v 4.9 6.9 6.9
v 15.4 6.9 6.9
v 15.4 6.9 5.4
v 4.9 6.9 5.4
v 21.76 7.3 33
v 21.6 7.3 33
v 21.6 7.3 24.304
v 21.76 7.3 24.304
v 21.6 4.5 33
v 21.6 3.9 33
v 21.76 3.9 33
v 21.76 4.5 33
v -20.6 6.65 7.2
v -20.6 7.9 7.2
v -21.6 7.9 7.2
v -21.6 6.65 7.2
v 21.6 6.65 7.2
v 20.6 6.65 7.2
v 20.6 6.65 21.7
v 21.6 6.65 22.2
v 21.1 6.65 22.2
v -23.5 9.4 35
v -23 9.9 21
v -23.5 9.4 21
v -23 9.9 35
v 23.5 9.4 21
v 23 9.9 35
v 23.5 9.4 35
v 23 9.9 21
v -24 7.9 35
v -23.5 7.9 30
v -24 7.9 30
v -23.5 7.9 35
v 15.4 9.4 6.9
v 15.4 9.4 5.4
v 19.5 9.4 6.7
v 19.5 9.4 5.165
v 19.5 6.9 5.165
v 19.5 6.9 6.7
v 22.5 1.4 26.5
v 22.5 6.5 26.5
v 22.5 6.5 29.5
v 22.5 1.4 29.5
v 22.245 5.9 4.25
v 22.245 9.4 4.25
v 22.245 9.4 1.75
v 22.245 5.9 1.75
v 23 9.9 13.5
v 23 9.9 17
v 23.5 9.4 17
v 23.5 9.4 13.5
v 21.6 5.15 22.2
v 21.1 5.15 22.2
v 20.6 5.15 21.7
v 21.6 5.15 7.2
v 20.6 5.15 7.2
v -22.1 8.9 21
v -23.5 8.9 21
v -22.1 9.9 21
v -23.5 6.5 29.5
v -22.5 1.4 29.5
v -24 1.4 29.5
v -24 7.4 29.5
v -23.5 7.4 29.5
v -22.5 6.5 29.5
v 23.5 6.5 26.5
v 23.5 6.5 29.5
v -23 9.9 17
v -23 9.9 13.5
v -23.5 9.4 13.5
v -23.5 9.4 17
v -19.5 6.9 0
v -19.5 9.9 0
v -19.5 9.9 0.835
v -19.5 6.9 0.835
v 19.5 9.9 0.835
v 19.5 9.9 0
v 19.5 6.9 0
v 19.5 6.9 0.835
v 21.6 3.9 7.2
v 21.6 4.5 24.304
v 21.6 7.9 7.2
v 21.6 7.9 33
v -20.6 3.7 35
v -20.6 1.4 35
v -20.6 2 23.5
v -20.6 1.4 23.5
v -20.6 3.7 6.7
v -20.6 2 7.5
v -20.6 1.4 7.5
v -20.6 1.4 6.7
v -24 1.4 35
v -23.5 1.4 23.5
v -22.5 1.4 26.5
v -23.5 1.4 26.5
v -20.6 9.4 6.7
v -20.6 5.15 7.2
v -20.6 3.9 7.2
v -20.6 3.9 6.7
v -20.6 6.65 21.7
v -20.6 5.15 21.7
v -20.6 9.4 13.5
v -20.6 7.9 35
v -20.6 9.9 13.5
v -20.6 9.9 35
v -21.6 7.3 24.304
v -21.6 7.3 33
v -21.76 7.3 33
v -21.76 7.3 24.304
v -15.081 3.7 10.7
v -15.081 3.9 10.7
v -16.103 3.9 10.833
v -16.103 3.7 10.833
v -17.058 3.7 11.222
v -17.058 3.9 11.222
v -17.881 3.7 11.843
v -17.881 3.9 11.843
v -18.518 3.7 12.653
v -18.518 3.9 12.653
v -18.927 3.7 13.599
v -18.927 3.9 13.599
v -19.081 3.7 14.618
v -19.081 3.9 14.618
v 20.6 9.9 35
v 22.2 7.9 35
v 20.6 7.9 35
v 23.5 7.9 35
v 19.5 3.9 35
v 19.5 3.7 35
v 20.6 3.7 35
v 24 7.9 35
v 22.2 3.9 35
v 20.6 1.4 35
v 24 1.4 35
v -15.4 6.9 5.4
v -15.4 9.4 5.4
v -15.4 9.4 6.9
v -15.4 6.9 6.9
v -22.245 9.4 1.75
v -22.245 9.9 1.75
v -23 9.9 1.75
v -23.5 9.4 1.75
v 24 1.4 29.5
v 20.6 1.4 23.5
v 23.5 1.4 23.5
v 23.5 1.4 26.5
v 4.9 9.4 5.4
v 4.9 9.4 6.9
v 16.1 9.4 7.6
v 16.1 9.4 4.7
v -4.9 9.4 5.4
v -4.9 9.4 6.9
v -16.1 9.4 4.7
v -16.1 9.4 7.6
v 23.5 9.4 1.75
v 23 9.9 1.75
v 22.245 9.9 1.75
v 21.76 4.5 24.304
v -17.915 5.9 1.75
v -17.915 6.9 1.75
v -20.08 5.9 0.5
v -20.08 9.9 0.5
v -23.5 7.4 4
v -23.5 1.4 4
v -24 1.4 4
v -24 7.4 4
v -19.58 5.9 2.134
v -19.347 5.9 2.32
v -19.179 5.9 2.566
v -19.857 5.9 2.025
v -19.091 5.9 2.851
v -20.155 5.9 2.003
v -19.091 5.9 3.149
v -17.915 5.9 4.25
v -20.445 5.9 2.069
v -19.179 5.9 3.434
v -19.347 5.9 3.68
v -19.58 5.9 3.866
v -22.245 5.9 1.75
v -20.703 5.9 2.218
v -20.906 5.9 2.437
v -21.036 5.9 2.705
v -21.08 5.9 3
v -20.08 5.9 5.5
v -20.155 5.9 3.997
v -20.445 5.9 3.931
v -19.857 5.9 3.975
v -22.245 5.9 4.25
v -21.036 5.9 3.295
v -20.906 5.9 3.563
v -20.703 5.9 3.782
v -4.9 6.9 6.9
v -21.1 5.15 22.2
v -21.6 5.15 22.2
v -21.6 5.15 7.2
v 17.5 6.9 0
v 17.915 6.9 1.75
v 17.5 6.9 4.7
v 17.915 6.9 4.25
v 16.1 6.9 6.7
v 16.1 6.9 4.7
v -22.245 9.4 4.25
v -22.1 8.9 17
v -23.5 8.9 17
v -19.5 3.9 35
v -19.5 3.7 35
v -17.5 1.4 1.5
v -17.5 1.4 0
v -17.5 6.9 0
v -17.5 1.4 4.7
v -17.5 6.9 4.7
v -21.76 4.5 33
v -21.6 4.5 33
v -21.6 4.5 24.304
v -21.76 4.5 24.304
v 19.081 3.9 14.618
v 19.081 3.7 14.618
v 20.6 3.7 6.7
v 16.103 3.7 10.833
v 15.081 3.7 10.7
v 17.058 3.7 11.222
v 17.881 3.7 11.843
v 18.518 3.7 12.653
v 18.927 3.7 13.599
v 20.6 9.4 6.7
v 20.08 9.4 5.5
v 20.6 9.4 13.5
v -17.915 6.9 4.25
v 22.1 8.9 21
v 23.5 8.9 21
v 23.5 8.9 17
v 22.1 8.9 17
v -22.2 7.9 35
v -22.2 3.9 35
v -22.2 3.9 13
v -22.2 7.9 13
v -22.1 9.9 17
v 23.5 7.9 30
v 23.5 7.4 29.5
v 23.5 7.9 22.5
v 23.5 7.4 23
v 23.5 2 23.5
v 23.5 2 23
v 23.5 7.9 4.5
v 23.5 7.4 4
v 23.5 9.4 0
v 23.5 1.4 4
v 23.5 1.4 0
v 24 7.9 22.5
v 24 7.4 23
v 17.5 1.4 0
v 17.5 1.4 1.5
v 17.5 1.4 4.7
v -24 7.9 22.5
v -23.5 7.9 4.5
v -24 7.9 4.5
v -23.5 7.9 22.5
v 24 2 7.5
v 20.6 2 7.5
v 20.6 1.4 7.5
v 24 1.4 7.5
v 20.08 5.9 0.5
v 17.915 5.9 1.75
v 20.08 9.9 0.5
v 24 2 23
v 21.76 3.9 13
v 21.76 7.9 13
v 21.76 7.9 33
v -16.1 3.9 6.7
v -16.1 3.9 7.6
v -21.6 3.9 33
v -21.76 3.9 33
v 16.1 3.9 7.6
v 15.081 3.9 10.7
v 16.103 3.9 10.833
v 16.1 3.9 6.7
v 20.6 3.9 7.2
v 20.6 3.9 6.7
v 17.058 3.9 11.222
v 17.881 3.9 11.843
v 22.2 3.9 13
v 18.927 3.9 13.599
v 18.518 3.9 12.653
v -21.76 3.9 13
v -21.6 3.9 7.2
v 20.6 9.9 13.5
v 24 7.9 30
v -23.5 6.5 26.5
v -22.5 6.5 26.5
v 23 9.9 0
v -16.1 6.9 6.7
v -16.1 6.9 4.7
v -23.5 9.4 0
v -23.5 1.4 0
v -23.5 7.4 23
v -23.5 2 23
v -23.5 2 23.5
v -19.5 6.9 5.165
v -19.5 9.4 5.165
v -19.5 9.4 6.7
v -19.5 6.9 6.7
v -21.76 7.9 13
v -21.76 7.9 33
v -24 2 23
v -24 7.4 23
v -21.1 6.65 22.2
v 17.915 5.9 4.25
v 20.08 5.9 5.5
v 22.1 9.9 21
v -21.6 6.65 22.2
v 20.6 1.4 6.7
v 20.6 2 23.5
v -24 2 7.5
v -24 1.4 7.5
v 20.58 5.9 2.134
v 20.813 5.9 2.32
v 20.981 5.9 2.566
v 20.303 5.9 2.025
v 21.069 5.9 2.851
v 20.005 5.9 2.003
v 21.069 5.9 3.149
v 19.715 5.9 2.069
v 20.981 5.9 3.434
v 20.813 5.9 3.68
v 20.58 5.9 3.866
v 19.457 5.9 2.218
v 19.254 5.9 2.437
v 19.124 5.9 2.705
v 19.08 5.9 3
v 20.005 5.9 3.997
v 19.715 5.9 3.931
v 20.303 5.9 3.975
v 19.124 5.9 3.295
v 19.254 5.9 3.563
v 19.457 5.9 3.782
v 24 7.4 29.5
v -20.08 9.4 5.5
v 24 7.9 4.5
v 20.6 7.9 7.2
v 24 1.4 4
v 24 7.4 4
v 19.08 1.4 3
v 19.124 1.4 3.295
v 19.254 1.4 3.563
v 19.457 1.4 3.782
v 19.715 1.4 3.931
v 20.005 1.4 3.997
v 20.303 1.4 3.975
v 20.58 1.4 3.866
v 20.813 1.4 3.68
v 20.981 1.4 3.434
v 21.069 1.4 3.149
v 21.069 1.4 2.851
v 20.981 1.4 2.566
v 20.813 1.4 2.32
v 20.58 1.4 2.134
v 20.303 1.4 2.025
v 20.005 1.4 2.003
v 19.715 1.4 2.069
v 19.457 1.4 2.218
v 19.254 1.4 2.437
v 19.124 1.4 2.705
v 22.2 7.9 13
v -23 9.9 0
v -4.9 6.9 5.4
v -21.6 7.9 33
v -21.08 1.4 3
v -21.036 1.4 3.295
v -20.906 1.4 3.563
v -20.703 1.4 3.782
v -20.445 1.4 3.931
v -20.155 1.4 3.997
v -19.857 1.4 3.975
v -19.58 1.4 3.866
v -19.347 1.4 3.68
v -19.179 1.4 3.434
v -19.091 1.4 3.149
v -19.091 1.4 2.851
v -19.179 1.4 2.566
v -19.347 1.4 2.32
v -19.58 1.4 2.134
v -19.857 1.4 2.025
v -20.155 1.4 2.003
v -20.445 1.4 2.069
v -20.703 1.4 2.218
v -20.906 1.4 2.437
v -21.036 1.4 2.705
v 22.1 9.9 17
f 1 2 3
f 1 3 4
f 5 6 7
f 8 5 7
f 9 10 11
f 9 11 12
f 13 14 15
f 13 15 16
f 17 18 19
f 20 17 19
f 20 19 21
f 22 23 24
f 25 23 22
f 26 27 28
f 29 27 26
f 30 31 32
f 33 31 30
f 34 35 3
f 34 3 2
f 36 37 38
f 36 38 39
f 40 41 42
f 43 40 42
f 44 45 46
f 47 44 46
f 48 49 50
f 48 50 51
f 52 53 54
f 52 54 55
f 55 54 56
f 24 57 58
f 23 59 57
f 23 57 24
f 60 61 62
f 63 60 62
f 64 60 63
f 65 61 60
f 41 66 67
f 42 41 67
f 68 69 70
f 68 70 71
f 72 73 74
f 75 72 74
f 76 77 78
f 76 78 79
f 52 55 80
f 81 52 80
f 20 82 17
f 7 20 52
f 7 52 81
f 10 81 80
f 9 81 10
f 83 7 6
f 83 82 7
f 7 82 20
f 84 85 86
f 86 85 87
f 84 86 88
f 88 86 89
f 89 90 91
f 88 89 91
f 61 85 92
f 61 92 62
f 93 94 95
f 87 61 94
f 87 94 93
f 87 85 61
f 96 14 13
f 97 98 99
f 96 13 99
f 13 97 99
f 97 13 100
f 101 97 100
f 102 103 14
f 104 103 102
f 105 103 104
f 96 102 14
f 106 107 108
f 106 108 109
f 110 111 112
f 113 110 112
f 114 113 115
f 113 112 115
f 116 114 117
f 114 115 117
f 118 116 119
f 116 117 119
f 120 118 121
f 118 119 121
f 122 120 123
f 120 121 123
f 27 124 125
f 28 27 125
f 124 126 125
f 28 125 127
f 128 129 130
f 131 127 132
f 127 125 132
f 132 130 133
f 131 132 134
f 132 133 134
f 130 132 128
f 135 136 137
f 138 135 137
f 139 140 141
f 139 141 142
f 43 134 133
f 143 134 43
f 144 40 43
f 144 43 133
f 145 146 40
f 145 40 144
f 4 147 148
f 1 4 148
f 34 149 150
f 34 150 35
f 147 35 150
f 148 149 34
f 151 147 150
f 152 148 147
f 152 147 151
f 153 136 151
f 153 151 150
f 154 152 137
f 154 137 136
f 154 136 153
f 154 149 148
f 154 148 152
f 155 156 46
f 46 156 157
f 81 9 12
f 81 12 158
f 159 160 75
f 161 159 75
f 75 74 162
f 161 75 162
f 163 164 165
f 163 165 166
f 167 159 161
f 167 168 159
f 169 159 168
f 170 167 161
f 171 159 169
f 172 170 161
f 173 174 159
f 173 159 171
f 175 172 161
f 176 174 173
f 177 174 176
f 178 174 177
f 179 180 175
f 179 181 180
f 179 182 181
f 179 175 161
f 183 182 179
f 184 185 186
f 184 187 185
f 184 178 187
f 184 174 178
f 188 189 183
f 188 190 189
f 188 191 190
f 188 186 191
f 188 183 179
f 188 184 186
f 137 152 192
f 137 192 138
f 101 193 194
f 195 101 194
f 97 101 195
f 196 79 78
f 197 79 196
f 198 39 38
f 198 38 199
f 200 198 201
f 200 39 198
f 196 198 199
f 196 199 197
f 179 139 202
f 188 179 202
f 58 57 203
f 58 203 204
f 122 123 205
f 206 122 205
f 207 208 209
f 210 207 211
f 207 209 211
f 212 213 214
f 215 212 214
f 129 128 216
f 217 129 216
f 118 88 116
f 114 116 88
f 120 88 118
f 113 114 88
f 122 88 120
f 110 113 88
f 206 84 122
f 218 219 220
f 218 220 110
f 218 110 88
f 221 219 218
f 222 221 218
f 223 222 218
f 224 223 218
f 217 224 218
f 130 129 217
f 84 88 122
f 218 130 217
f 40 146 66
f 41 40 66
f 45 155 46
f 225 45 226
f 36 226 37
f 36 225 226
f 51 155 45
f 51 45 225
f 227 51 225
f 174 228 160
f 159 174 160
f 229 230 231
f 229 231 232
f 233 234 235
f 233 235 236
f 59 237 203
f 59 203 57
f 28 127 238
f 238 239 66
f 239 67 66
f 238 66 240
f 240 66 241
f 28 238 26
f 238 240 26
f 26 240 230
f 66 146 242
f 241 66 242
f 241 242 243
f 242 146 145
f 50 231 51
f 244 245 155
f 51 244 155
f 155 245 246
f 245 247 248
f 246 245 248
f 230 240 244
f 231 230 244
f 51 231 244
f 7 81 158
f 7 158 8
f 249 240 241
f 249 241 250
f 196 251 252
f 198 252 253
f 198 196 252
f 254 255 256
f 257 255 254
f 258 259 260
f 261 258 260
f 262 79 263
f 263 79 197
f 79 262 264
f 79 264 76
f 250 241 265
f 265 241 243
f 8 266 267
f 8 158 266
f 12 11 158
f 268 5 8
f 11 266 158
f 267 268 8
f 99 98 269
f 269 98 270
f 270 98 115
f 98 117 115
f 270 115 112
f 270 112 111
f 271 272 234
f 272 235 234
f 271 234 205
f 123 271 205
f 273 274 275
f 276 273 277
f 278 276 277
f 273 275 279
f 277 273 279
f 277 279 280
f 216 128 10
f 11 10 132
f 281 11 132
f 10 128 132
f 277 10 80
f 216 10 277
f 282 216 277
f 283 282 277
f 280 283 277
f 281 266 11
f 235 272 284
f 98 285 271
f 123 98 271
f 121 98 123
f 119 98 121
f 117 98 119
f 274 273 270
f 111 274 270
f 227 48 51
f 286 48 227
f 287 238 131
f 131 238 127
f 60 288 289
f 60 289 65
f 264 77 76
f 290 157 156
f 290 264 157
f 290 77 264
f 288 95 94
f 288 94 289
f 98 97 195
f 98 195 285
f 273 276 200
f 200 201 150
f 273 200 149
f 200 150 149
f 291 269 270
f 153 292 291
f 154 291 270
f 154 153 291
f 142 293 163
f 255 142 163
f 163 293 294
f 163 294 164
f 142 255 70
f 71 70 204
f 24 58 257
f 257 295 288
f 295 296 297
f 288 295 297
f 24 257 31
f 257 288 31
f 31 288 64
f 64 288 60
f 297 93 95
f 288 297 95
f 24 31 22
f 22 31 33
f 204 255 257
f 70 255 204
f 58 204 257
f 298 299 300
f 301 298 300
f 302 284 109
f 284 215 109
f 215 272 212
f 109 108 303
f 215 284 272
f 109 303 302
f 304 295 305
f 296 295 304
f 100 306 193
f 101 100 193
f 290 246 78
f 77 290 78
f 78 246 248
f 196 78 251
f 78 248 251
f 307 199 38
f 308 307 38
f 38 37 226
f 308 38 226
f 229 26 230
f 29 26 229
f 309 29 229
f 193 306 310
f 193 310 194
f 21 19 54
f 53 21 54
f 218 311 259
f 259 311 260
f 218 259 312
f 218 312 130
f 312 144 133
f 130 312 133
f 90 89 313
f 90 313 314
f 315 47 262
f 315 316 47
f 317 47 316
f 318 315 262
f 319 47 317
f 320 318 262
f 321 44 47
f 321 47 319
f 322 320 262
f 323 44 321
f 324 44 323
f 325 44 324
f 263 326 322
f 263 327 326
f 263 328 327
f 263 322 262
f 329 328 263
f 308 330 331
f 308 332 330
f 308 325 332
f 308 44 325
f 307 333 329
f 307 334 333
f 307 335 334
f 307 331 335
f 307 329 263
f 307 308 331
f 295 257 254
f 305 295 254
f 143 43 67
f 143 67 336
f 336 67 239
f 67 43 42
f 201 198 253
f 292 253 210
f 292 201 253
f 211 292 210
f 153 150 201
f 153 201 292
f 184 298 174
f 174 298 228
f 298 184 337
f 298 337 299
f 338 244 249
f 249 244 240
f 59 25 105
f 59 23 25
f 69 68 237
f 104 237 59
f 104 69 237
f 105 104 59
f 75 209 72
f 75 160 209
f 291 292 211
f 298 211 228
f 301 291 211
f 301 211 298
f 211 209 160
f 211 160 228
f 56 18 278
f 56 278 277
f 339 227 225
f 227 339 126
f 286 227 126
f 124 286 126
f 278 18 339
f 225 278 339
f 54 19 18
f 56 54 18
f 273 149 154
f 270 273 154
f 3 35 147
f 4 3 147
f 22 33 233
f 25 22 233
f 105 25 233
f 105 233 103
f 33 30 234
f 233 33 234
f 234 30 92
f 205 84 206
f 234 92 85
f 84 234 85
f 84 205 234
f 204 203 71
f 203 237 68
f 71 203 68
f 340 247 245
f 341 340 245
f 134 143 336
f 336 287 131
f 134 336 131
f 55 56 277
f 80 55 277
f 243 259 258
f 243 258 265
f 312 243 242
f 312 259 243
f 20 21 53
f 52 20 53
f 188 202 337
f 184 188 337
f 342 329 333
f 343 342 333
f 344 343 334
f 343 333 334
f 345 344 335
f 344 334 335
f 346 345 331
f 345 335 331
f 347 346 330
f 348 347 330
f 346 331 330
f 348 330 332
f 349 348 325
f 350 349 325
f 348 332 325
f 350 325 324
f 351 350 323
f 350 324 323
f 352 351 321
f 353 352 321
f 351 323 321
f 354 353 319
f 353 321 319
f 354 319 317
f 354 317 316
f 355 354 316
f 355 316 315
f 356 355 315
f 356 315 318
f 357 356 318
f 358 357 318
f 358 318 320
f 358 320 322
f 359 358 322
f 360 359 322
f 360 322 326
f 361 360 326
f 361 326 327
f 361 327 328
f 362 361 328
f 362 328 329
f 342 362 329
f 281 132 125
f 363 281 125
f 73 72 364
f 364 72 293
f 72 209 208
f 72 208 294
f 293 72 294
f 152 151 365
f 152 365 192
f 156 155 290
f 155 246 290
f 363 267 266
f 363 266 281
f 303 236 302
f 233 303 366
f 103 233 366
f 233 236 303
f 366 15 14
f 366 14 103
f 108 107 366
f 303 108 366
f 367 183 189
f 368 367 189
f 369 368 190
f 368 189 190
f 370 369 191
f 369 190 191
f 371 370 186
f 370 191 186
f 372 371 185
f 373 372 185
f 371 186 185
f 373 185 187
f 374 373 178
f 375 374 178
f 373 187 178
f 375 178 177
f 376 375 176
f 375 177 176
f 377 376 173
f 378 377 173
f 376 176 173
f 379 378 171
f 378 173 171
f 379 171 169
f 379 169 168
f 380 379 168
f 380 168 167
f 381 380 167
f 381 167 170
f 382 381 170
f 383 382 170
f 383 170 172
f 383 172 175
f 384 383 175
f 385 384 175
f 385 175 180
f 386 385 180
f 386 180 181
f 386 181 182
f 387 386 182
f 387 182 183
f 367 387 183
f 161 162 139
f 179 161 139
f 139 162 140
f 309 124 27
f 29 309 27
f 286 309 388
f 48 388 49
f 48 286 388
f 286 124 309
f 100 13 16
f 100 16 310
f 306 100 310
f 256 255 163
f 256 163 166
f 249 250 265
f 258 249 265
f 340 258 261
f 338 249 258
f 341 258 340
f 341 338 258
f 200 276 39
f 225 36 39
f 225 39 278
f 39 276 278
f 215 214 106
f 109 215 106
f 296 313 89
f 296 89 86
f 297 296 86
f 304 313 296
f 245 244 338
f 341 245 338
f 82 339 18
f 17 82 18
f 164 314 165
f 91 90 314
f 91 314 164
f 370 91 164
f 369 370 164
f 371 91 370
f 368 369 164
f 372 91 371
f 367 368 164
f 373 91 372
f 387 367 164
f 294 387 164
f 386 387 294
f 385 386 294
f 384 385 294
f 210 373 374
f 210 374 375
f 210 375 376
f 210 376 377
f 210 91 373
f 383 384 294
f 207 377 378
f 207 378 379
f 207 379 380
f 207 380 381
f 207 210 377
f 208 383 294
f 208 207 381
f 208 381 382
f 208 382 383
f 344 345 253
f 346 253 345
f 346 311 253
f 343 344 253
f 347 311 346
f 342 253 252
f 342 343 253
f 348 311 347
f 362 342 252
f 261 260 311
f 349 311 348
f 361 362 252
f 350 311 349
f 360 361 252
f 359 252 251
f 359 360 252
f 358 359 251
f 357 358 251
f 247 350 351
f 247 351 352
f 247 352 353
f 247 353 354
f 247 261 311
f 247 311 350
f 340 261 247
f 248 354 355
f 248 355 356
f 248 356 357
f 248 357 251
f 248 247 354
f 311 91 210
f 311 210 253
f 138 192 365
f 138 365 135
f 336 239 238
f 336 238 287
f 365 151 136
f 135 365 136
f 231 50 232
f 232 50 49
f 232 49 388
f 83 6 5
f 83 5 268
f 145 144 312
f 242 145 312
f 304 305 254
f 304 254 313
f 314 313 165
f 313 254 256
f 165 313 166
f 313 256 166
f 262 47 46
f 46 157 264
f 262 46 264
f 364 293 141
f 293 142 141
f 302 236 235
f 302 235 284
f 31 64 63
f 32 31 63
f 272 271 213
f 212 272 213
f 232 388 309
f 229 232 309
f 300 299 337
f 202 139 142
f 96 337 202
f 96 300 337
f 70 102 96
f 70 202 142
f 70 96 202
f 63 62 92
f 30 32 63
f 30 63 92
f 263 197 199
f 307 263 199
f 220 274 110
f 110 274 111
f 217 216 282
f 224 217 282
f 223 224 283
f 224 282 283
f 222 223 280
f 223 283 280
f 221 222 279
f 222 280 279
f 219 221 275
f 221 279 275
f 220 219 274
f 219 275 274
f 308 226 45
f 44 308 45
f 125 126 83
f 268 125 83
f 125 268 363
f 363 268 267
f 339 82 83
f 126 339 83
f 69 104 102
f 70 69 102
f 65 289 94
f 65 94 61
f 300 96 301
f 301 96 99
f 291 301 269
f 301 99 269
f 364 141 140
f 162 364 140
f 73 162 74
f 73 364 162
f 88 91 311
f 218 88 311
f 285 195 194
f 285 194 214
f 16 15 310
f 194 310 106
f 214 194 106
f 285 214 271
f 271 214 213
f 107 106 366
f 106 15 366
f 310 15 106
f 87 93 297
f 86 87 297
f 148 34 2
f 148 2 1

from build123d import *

# Parameters (mm, degrees)
EXTRUIR1_DEPTH         = 9.9
CROQUIS2_R             = 1
CORTAR_EXTRUIR1_DEPTH  = 15.9
CORTAR_EXTRUIR2_DEPTH  = 4
CROQUIS4_W             = 35
CROQUIS4_H             = 2.727458855
CORTAR_EXTRUIR3_DEPTH  = 24
CROQUIS5_W             = 35
CROQUIS5_H             = 3.2
CORTAR_EXTRUIR4_DEPTH  = 8.5
CROQUIS6_W             = 39
CROQUIS6_H             = 14.452712812
CORTAR_EXTRUIR5_DEPTH  = 3
EXTRUIR2_DEPTH         = 0.2
CROQUIS8_W             = 49.57319474
CROQUIS8_H             = 11.75
CORTAR_EXTRUIR6_DEPTH  = 0.5
CROQUIS9_W             = 2.460261438
CROQUIS9_H             = 4
CORTAR_EXTRUIR7_DEPTH  = 1
CHAFL_N1_SIZE          = 0.5
CHAFL_N2_SIZE          = 0.5
CROQUIS10_W            = 32.2
CROQUIS10_H            = 2.9
EXTRUIR3_DEPTH         = 5.5
CROQUIS11_W            = 10.5
CROQUIS11_H            = 1.5
CORTAR_EXTRUIR8_DEPTH  = 2.5
CROQUIS12_W            = 16
CROQUIS12_H            = 2
CORTAR_EXTRUIR9_DEPTH  = 57.5
CROQUIS13_W            = 35
CROQUIS13_H            = 3.2
CORTAR_EXTRUIR10_DEPTH = 0.7
CROQUIS15_W            = 5.5
CROQUIS15_H            = 7.9
EXTRUIR4_DEPTH         = 0.5
CHAFL_N3_SIZE          = 0.5
CROQUIS16_W            = 3
CROQUIS16_H            = 6.5
CORTAR_EXTRUIR11_DEPTH = 1
CHAFL_N4_SIZE          = 0.5
CORTAR_EXTRUIR12_DEPTH = 1
CHAFL_N5_SIZE          = 0.5
CHAFL_N6_SIZE          = 0.5
CROQUIS18_W            = 0.4398817
CROQUIS18_H            = 4
CORTAR_EXTRUIR13_DEPTH = 22
CROQUIS19_W            = 10.696044144
CROQUIS19_H            = 2.8
CORTAR_EXTRUIR14_DEPTH = 0.2
CROQUIS20_W            = 2
CROQUIS20_H            = 4
CORTAR_EXTRUIR15_DEPTH = 0.2
CROQUIS21_W            = 42.865199157
CROQUIS21_H            = 3.067417921
CORTAR_EXTRUIR16_DEPTH = 58


with BuildPart() as part:
    # Croquis1 → Extruir1 (new body)
    with BuildSketch(Plane(origin=(0, 0, 0), x_dir=(1, 0, 0), z_dir=(0, 1, 0))):
        Polygon((23.5, 0), (-23.5, 0), (-23.5, -35), (-20.6, -35), (-20.6, -6.7), (20.6, -6.7), (20.6, -35), (23.5, -35), align=None)
    extrude(amount=EXTRUIR1_DEPTH)

    # Croquis2 → Cortar-Extruir1 (cut)
    with BuildSketch(Plane(origin=(0, 9.9, 0), x_dir=(-1, 0, 0), z_dir=(0, 1, 0))):
        with Locations((-20.08, 3)):
            Circle(CROQUIS2_R)
        with Locations((20.08, 3)):
            Circle(CROQUIS2_R)
    extrude(amount=-CORTAR_EXTRUIR1_DEPTH, mode=Mode.SUBTRACT)

    # Croquis3 → Cortar-Extruir2 (cut)
    with BuildSketch(Plane(origin=(0, 9.9, 0), x_dir=(-1, 0, 0), z_dir=(0, 1, 0))):
        Polygon((-20.08, 5.5), (-22.245063509, 4.25), (-22.245063509, 1.75), (-20.08, 0.5), (-17.914936491, 1.75), (-17.914936491, 4.25), align=None)
        Polygon((20.08, 5.5), (17.914936491, 4.25), (17.914936491, 1.75), (20.08, 0.5), (22.245063509, 1.75), (22.245063509, 4.25), align=None)
    extrude(amount=-CORTAR_EXTRUIR2_DEPTH, mode=Mode.SUBTRACT)

    # Croquis4 → Cortar-Extruir3 (cut)
    with BuildSketch(Plane(origin=(0, 9.9, 0), x_dir=(-1, 0, 0), z_dir=(0, 1, 0))):
        with Locations((0, 0.136270572)):
            Rectangle(CROQUIS4_W, CROQUIS4_H)
    extrude(amount=-CORTAR_EXTRUIR3_DEPTH, mode=Mode.SUBTRACT)

    # Croquis5 → Cortar-Extruir4 (cut)
    with BuildSketch(Plane(origin=(0, 9.9, 0), x_dir=(-1, 0, 0), z_dir=(0, 1, 0))):
        with Locations((0, 3.1)):
            Rectangle(CROQUIS5_W, CROQUIS5_H)
    extrude(amount=-CORTAR_EXTRUIR4_DEPTH, mode=Mode.SUBTRACT)

    # Croquis6 → Cortar-Extruir5 (cut)
    with BuildSketch(Plane(origin=(0, 9.9, 0), x_dir=(-1, 0, 0), z_dir=(0, 1, 0))):
        with Locations((0, 5.388219545)):
            Rectangle(CROQUIS6_W, CROQUIS6_H)
    extrude(amount=-CORTAR_EXTRUIR5_DEPTH, mode=Mode.SUBTRACT)

    # Croquis7 → Extruir2 (add)
    with BuildSketch(Plane(origin=(0, 3.9, 0), x_dir=(-1, 0, 0), z_dir=(0, 1, 0))):
        with BuildLine():
            Line((-20.6, 35), (-19.5, 35))
            Line((-19.5, 35), (-19.080611376, 14.617712891))
            ThreePointArc((-19.080611376, 14.617712891), (-17.880640918, 11.842628092), (-15.081457862, 10.7))
            Line((-15.081457862, 10.7), (15.081457862, 10.7))
            ThreePointArc((15.081457862, 10.7), (17.880640918, 11.842628092), (19.080611376, 14.617712891))
            Line((19.080611376, 14.617712891), (19.5, 35))
            Line((19.5, 35), (20.6, 35))
            Line((20.6, 35), (20.6, 6.7))
            Line((20.6, 6.7), (-20.6, 6.7))
            Line((-20.6, 6.7), (-20.6, 35))
        make_face()
    extrude(amount=-EXTRUIR2_DEPTH)

    # Croquis8 → Cortar-Extruir6 (cut)
    with BuildSketch(Plane(origin=(0, 9.9, 0), x_dir=(-1, 0, 0), z_dir=(0, 1, 0))):
        with Locations((0.155531932, 7.625)):
            Rectangle(CROQUIS8_W, CROQUIS8_H)
    extrude(amount=-CORTAR_EXTRUIR6_DEPTH, mode=Mode.SUBTRACT)

    # Croquis9 → Cortar-Extruir7 (cut)
    with BuildSketch(Plane(origin=(0, 9.9, 0), x_dir=(-1, 0, 0), z_dir=(0, 1, 0))):
        with Locations((23.330130719, 19)):
            Rectangle(CROQUIS9_W, CROQUIS9_H)
        with Locations((-23.330130719, 19)):
            Rectangle(CROQUIS9_W, CROQUIS9_H)
    extrude(amount=-CORTAR_EXTRUIR7_DEPTH, mode=Mode.SUBTRACT)

    # Chaflán1
    chafl_n1_edges = [part.edges().sort_by_distance(p)[0] for p in [
        (23.5, 9.9, 15.25),
        (23.5, 9.9, 28),
        (-23.5, 9.9, 28),
        (-23.5, 9.9, 15.25),
    ]]
    chamfer(chafl_n1_edges, length=CHAFL_N1_SIZE)

    # Chaflán2
    chafl_n2_edges = [part.edges().sort_by_distance(p)[0] for p in [
        (23.5, 9.9, 0.875),
        (-23.5, 9.9, 0.875),
    ]]
    chamfer(chafl_n2_edges, length=CHAFL_N2_SIZE)

    # Croquis10 → Extruir3 (add)
    with BuildSketch(Plane(origin=(0, 9.4, 0), x_dir=(-1, 0, 0), z_dir=(0, 1, 0))):
        with Locations((0, 6.15)):
            Rectangle(CROQUIS10_W, CROQUIS10_H)
    extrude(amount=-EXTRUIR3_DEPTH)

    # Croquis11 → Cortar-Extruir8 (cut)
    with BuildSketch(Plane(origin=(0, 9.4, 0), x_dir=(-1, 0, 0), z_dir=(0, 1, 0))):
        with Locations((-10.15, 6.15)):
            Rectangle(CROQUIS11_W, CROQUIS11_H)
        with Locations((10.15, 6.15)):
            Rectangle(CROQUIS11_W, CROQUIS11_H)
    extrude(amount=-CORTAR_EXTRUIR8_DEPTH, mode=Mode.SUBTRACT)

    # Croquis12 → Cortar-Extruir9 (cut)
    with BuildSketch(Plane.ZY.offset(23.5)):
        with Locations((15.5, 1)):
            Rectangle(CROQUIS12_W, CROQUIS12_H)
    extrude(amount=-CORTAR_EXTRUIR9_DEPTH, mode=Mode.SUBTRACT)

    # Croquis13 → Cortar-Extruir10 (cut)
    with BuildSketch(Plane.XZ):
        with Locations((0, 3.1)):
            Rectangle(CROQUIS13_W, CROQUIS13_H)
    extrude(amount=-CORTAR_EXTRUIR10_DEPTH, mode=Mode.SUBTRACT)

    # Croquis15 → Extruir4 (add)
    with BuildSketch(Plane.ZY.offset(23.5)):
        Polygon((4, 0), (4, 7.9), (23, 7.9), (23, 2), (7.5, 2), (7.5, 0), align=None)
        with Locations((32.25, 3.95)):
            Rectangle(CROQUIS15_W, CROQUIS15_H)
    extruir4 = extrude(amount=EXTRUIR4_DEPTH)

    # Chaflán3
    chafl_n3_edges = [part.edges().sort_by_distance(p)[0] for p in [
        (-23.75, 7.9, 29.5),
        (-23.75, 7.9, 23),
        (-23.75, 7.9, 4),
    ]]
    chamfer(chafl_n3_edges, length=CHAFL_N3_SIZE)

    # Croquis16 → Cortar-Extruir11 (cut)
    with BuildSketch(Plane.ZY.offset(23.5)):
        with Locations((28, 3.25)):
            Rectangle(CROQUIS16_W, CROQUIS16_H)
    cortar_extruir11 = extrude(amount=-CORTAR_EXTRUIR11_DEPTH, mode=Mode.SUBTRACT)

    # Simetría1: Extruir4, Cortar-Extruir11 across plane
    add(extruir4.mirror(Plane(origin=(0, 0, 0), x_dir=(0, 0, 1), z_dir=(1, 0, 0))))
    add(cortar_extruir11.mirror(Plane(origin=(0, 0, 0), x_dir=(0, 0, 1), z_dir=(1, 0, 0))), mode=Mode.SUBTRACT)

    # Chaflán4
    chafl_n4_edges = [part.edges().sort_by_distance(p)[0] for p in [
        (23.75, 7.9, 4),
        (23.75, 7.9, 23),
        (23.75, 7.9, 29.5),
    ]]
    chamfer(chafl_n4_edges, length=CHAFL_N4_SIZE)

    # Croquis17 → Cortar-Extruir12 (cut)
    with BuildSketch(Plane(origin=(-20.6, 0, 0), x_dir=(0, 0, -1), z_dir=(1, 0, 0))):
        Polygon((-35, 7.9), (-7.2, 7.9), (-7.2, 6.65), (-22.2, 6.65), (-22.2, 5.15), (-7.2, 5.15), (-7.2, 3.9), (-35, 3.9), align=None)
    cortar_extruir12 = extrude(amount=-CORTAR_EXTRUIR12_DEPTH, mode=Mode.SUBTRACT)

    # Chaflán5
    chafl_n5_edges = [part.edges().sort_by_distance(p)[0] for p in [
        (-20.6, 5.9, 22.2),
    ]]
    chamfer(chafl_n5_edges, length=CHAFL_N5_SIZE)

    # Simetría2: Cortar-Extruir12 across plane
    add(cortar_extruir12.mirror(Plane(origin=(0, 0, 0), x_dir=(0, 0, 1), z_dir=(1, 0, 0))), mode=Mode.SUBTRACT)

    # Chaflán6
    chafl_n6_edges = [part.edges().sort_by_distance(p)[0] for p in [
        (20.6, 5.9, 22.2),
    ]]
    chamfer(chafl_n6_edges, length=CHAFL_N6_SIZE)

    # Croquis18 → Cortar-Extruir13 (cut)
    with BuildSketch(Plane.XY.offset(35)):
        with Locations((-21.98005915, 5.9)):
            Rectangle(CROQUIS18_W, CROQUIS18_H)
        with Locations((21.98005915, 5.9)):
            Rectangle(CROQUIS18_W, CROQUIS18_H)
    extrude(amount=-CORTAR_EXTRUIR13_DEPTH, mode=Mode.SUBTRACT)

    # Croquis19 → Cortar-Extruir14 (cut)
    with BuildSketch(Plane(origin=(-21.6, 0, 0), x_dir=(0, 0, -1), z_dir=(1, 0, 0))):
        with Locations((-29.651977928, 5.9)):
            Rectangle(CROQUIS19_W, CROQUIS19_H)
    cortar_extruir14 = extrude(amount=-CORTAR_EXTRUIR14_DEPTH, mode=Mode.SUBTRACT)

    # Croquis20 → Cortar-Extruir15 (cut)
    with BuildSketch(Plane(origin=(-21.6, 0, 0), x_dir=(0, 0, -1), z_dir=(1, 0, 0))):
        with Locations((-34, 5.9)):
            Rectangle(CROQUIS20_W, CROQUIS20_H)
    cortar_extruir15 = extrude(amount=-CORTAR_EXTRUIR15_DEPTH, mode=Mode.SUBTRACT)

    # Simetría3: Cortar-Extruir14, Cortar-Extruir15 across plane
    add(cortar_extruir14.mirror(Plane(origin=(0, 0, 0), x_dir=(0, 0, 1), z_dir=(1, 0, 0))), mode=Mode.SUBTRACT)
    add(cortar_extruir15.mirror(Plane(origin=(0, 0, 0), x_dir=(0, 0, 1), z_dir=(1, 0, 0))), mode=Mode.SUBTRACT)

    # Croquis21 → Cortar-Extruir16 (cut)
    with BuildSketch(Plane(origin=(24, 0, 0), x_dir=(0, 0, -1), z_dir=(1, 0, 0))):
        with Locations((-17.067402922, -0.133708961)):
            Rectangle(CROQUIS21_W, CROQUIS21_H)
    extrude(amount=-CORTAR_EXTRUIR16_DEPTH, mode=Mode.SUBTRACT)


solid = part.part
